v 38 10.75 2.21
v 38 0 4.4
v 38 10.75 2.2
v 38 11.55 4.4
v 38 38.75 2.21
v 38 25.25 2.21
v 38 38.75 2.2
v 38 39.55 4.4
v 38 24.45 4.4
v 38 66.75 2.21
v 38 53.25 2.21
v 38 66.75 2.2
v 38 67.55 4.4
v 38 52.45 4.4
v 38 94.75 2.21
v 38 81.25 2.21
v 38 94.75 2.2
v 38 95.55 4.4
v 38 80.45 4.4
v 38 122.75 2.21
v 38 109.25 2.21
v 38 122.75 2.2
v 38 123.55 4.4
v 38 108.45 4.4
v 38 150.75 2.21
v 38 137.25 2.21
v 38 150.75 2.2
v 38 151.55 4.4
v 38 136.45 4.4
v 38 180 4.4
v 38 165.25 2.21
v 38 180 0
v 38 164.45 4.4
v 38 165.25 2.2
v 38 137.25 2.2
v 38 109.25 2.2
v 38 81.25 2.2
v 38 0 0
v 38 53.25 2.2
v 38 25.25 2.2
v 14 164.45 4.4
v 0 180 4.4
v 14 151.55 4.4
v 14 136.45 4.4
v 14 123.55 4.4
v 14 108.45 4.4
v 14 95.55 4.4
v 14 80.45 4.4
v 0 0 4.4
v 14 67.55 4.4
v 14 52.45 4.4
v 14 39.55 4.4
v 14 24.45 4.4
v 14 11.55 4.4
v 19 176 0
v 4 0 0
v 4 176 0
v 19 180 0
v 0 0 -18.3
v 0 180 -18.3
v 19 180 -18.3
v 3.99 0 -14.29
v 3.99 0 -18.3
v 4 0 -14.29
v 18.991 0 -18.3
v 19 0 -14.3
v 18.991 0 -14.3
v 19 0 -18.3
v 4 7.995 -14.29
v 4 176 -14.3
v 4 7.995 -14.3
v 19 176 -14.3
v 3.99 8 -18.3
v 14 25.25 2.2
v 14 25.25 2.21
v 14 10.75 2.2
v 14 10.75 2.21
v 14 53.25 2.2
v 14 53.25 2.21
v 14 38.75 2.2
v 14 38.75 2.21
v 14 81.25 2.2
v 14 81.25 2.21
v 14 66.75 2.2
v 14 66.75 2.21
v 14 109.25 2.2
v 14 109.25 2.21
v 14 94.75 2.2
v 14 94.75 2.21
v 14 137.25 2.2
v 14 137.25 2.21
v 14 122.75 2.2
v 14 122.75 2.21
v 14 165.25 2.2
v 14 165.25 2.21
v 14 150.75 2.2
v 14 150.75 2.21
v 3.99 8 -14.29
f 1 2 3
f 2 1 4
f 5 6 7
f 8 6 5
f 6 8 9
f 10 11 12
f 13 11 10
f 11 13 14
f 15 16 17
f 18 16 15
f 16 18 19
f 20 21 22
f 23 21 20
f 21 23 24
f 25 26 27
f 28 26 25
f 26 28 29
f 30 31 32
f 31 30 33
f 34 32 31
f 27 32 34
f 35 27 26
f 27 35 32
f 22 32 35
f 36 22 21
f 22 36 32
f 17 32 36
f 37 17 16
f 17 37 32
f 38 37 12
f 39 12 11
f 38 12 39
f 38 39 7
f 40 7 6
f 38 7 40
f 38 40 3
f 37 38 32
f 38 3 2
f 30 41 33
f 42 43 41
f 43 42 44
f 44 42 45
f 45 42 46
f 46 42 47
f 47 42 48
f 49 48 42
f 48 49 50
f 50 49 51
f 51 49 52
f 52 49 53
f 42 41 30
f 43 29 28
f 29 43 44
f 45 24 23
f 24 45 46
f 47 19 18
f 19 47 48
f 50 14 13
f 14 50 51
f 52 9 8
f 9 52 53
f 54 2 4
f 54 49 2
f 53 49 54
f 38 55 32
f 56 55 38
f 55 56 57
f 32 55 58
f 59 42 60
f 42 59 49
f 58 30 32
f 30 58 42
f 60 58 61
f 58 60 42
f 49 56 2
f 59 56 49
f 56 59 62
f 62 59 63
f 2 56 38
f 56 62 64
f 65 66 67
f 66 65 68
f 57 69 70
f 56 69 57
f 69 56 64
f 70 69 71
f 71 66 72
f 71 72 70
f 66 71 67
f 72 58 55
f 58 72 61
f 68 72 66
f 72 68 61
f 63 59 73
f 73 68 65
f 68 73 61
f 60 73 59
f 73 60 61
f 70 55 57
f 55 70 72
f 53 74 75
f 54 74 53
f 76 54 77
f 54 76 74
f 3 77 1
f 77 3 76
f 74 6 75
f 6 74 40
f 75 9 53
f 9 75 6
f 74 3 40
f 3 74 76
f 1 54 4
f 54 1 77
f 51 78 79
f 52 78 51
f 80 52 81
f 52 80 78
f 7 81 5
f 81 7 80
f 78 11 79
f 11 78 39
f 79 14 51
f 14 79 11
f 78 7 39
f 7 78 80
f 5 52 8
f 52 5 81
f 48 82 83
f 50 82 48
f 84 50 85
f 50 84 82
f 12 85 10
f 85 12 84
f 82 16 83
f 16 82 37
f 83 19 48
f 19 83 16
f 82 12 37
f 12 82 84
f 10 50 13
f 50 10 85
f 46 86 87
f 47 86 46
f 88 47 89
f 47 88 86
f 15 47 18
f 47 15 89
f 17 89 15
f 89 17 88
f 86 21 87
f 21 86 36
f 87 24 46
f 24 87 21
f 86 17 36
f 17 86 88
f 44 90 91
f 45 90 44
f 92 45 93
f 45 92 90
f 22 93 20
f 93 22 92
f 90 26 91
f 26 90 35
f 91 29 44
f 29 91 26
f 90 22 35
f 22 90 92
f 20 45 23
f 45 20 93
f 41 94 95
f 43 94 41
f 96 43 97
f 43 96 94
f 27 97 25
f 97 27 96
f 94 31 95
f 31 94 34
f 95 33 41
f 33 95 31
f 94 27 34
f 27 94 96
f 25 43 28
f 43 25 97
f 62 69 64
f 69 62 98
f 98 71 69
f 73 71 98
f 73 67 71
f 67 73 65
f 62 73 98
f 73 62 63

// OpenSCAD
// ============================================
// OpenGrid Under-Desk MacBook Air M2 Slide-In Holder v1
//
// CONCEPT: Two C-channel rails mounted to OpenGrid.
// The laptop slides in horizontally from the front.
// Gravity presses the laptop DOWN onto the lips and
// UP against the desk — both directions help retention.
// The only way to remove the laptop is to pull it
// forward (horizontally), which gravity can't do.
//
// This replaces the v5 drop-in cradle, which couldn't
// retain the laptop because gravity pulled it straight
// out of the open bottom.
//
// PIECES: Print 2 copies of this rail. Flip one 180°
//         around the Y-axis to create a mirrored pair.
//
// CROSS-SECTION (mounted under desk):
//
//   DESK / GRID PANEL (above)
//   ═══════════════════════════════════
//   ┌────────────────────────────────┐ ← flange (top)
//   └──┬─────────────────────────────┘
//      │
//      │ outer wall        ← open inner side
//      │                     (laptop edge enters here)
//      │
//   ┌──┤                              ← lip (shelf)
//   │  │     laptop edge rests here
//   └──┘
//
// HOW IT WORKS:
//   - Lip catches the laptop edge from below
//   - Desk surface constrains from above (via flange)
//   - Outer wall constrains from the side
//   - Backstop wall at rear prevents over-insertion
//   - Entry chamfer at front guides laptop onto lips
//
// MOUNTING: OpenGrid Multiconnect dovetail system.
//   Dovetail channels on top face of each rail flange.
//   Snaps slide in from the inner edge (toward laptop).
//   Multiple channels at 28mm grid pitch along rail.
//   Print snaps separately: makerworld.com/en/models/1179191
//
// INSTALL:
//   1. Snap both rails to OpenGrid, lips facing inward
//   2. Space rails ~11 grid holes apart (308mm wall-to-wall)
//   3. Slide laptop in from the front
//   4. Backstop prevents over-insertion
//
// SPACING GUIDE (wall-to-wall inner distance):
//   Target: laptop_w + 2-6mm clearance
//   At 11 × 28mm grid = 308mm → ~4mm total clearance ✓
//   Lip overlap per side ≈ 13mm (laptop 304.1 on 15mm lips)
//
// PRINT: Flange flat on bed. Lip overhang needs support
//        material, or print on side (C-opening facing up).
//
// Channel dims from official OpenGrid Thread Docs PDF:
//   slot (top, narrow) = 12.9mm
//   wide (bottom, undercut) = 14.5mm
//   depth = 2.2mm
//
// Repo: github.com/johntondreau-png/opengrid-desk-mounts
// ============================================

/* [Laptop Dimensions] */
// MacBook Air M2 width (mm)
laptop_w = 304.1;
// MacBook Air M2 depth (mm)
laptop_d = 215.0;
// MacBook Air M2 thickness (mm)
laptop_h = 11.3;

/* [Rail Geometry] */
// Wall thickness (mm)
wall = 4.0;
// Vertical clearance above laptop in channel (mm)
gap = 3.0;
// Lip depth — how far lip extends under laptop edge (mm)
lip_depth = 15;
// Rail length front-to-back (mm)
rail_len = 180;
// Entry chamfer length at front of lip (mm)
chamfer = 8;

/* [OpenGrid Snaps] */
// Grid spacing center-to-center (mm)
grid = 28;

/* [Hidden] */
// Channel height = laptop thickness + clearance above
channel_h = laptop_h + gap;   // 14.3mm

// Multiconnect dovetail channel dims (Thread Docs PDF)
// Narrow slot at top (grid side), wider undercut below.
ch_slot  = 12.9;   // narrow opening at top surface
ch_wide  = 14.5;   // wider undercut (locks snap T-flange)
ch_d     = 2.2;    // channel depth into flange

// Snap travel distance in channel
snap_len = 24.0;

// Flange thickness: channel depth + solid backing
flange_t = ch_d + 2.2;   // 4.4mm

// Flange width: snap length + wall + margin
flange_w = snap_len + wall + 10;  // 38mm

eps = 0.01;

// ============================================
// mc_dovetail_x(len)
//
// Female Multiconnect dovetail channel cutter.
// Runs along +X direction, centered on Y, cuts into -Z.
//
// At Z=0 (top surface, faces grid panel):
//   slot width = ch_slot = 12.9mm (narrow opening)
// At Z=-ch_d (deeper into flange):
//   slot width = ch_wide = 14.5mm (wider undercut)
//
// The snap T-flange locks into the undercut.
// Place with origin at top-center of channel entry.
// Open end at X=0; stop wall = solid material at X=len.
// ============================================
module mc_dovetail_x(len) {
  hull() {
    // Narrow slab at top surface: ch_slot wide
    translate([0, -ch_slot/2, -eps])
      cube([len, ch_slot, eps]);
    // Wide slab at channel bottom: ch_wide wide
    translate([0, -ch_wide/2, -ch_d])
      cube([len, ch_wide, eps]);
  }
}

// ============================================
// RAIL
//
// C-channel profile that captures one laptop edge.
// Multiple dovetail channels on the flange for mounting.
// Backstop wall at rear prevents over-insertion.
// Entry chamfer at front guides laptop onto lip.
//
// Orientation in model space:
//   X = across rail (wall at x=0, lip extends toward +X)
//   Y = along rail length (front=0, back=rail_len)
//   Z = vertical (flange top = +flange_t, lip bottom = -(channel_h+wall))
//
// Print 2 copies. Flip one around Y for left/right pair.
// ============================================
module rail() {
  // Number of dovetail channels along rail length
  n_ch = floor((rail_len - 2 * wall) / grid);

  difference() {
    union() {
      // ---- Flange (top plate, mounts to grid panel) ----
      // Full width, provides mounting surface and snap channels
      cube([flange_w, rail_len, flange_t]);

      // ---- Outer wall (hangs below flange at x=0 edge) ----
      // Constrains laptop from the side
      translate([0, 0, -channel_h])
        cube([wall, rail_len, channel_h]);

      // ---- Lip (extends inward from wall bottom) ----
      // Laptop edge rests on this shelf
      translate([0, 0, -(channel_h + wall)])
        cube([wall + lip_depth, rail_len, wall]);

      // ---- Backstop (rear wall, closes channel at back) ----
      // Prevents laptop from sliding out the back
      translate([0, rail_len - wall, -(channel_h + wall)])
        cube([wall + lip_depth, wall, channel_h + wall + flange_t]);
    }

    // ---- Dovetail channels ----
    // Run in +X direction (across flange width).
    // Open at inner edge (x = flange_w) where snap slides in.
    // Stop wall at x = flange_w - snap_len (solid material beyond).
    // Spaced at grid pitch (28mm) along rail length (Y).
    for (i = [0 : n_ch - 1]) {
      cy = wall + grid / 2 + i * grid;
      // Channel runs from x=(flange_w - snap_len) to x=flange_w
      // Open at x=flange_w (inner edge), stopped at other end
      translate([flange_w - snap_len, cy, flange_t])
        mc_dovetail_x(snap_len + eps);
    }

    // ---- Entry chamfer on lip ----
    // At the front of the rail (Y=0 to Y=chamfer), the lip
    // tapers from zero to full depth. This creates a funnel
    // that guides the laptop edge onto the lip surface.
    //
    // Triangle in XY plane, extruded through lip height (Z):
    //   At Y=0: full lip removed (easy entry)
    //   At Y=chamfer: lip is full depth (laptop captured)
    translate([wall - eps, -eps, -(channel_h + wall) - eps])
      linear_extrude(height = wall + 2 * eps)
        polygon([
          [0, 0],
          [lip_depth + 2 * eps, 0],
          [0, chamfer + eps]
        ]);
  }
}

// ============================================
// RENDER
// ============================================
rail();
